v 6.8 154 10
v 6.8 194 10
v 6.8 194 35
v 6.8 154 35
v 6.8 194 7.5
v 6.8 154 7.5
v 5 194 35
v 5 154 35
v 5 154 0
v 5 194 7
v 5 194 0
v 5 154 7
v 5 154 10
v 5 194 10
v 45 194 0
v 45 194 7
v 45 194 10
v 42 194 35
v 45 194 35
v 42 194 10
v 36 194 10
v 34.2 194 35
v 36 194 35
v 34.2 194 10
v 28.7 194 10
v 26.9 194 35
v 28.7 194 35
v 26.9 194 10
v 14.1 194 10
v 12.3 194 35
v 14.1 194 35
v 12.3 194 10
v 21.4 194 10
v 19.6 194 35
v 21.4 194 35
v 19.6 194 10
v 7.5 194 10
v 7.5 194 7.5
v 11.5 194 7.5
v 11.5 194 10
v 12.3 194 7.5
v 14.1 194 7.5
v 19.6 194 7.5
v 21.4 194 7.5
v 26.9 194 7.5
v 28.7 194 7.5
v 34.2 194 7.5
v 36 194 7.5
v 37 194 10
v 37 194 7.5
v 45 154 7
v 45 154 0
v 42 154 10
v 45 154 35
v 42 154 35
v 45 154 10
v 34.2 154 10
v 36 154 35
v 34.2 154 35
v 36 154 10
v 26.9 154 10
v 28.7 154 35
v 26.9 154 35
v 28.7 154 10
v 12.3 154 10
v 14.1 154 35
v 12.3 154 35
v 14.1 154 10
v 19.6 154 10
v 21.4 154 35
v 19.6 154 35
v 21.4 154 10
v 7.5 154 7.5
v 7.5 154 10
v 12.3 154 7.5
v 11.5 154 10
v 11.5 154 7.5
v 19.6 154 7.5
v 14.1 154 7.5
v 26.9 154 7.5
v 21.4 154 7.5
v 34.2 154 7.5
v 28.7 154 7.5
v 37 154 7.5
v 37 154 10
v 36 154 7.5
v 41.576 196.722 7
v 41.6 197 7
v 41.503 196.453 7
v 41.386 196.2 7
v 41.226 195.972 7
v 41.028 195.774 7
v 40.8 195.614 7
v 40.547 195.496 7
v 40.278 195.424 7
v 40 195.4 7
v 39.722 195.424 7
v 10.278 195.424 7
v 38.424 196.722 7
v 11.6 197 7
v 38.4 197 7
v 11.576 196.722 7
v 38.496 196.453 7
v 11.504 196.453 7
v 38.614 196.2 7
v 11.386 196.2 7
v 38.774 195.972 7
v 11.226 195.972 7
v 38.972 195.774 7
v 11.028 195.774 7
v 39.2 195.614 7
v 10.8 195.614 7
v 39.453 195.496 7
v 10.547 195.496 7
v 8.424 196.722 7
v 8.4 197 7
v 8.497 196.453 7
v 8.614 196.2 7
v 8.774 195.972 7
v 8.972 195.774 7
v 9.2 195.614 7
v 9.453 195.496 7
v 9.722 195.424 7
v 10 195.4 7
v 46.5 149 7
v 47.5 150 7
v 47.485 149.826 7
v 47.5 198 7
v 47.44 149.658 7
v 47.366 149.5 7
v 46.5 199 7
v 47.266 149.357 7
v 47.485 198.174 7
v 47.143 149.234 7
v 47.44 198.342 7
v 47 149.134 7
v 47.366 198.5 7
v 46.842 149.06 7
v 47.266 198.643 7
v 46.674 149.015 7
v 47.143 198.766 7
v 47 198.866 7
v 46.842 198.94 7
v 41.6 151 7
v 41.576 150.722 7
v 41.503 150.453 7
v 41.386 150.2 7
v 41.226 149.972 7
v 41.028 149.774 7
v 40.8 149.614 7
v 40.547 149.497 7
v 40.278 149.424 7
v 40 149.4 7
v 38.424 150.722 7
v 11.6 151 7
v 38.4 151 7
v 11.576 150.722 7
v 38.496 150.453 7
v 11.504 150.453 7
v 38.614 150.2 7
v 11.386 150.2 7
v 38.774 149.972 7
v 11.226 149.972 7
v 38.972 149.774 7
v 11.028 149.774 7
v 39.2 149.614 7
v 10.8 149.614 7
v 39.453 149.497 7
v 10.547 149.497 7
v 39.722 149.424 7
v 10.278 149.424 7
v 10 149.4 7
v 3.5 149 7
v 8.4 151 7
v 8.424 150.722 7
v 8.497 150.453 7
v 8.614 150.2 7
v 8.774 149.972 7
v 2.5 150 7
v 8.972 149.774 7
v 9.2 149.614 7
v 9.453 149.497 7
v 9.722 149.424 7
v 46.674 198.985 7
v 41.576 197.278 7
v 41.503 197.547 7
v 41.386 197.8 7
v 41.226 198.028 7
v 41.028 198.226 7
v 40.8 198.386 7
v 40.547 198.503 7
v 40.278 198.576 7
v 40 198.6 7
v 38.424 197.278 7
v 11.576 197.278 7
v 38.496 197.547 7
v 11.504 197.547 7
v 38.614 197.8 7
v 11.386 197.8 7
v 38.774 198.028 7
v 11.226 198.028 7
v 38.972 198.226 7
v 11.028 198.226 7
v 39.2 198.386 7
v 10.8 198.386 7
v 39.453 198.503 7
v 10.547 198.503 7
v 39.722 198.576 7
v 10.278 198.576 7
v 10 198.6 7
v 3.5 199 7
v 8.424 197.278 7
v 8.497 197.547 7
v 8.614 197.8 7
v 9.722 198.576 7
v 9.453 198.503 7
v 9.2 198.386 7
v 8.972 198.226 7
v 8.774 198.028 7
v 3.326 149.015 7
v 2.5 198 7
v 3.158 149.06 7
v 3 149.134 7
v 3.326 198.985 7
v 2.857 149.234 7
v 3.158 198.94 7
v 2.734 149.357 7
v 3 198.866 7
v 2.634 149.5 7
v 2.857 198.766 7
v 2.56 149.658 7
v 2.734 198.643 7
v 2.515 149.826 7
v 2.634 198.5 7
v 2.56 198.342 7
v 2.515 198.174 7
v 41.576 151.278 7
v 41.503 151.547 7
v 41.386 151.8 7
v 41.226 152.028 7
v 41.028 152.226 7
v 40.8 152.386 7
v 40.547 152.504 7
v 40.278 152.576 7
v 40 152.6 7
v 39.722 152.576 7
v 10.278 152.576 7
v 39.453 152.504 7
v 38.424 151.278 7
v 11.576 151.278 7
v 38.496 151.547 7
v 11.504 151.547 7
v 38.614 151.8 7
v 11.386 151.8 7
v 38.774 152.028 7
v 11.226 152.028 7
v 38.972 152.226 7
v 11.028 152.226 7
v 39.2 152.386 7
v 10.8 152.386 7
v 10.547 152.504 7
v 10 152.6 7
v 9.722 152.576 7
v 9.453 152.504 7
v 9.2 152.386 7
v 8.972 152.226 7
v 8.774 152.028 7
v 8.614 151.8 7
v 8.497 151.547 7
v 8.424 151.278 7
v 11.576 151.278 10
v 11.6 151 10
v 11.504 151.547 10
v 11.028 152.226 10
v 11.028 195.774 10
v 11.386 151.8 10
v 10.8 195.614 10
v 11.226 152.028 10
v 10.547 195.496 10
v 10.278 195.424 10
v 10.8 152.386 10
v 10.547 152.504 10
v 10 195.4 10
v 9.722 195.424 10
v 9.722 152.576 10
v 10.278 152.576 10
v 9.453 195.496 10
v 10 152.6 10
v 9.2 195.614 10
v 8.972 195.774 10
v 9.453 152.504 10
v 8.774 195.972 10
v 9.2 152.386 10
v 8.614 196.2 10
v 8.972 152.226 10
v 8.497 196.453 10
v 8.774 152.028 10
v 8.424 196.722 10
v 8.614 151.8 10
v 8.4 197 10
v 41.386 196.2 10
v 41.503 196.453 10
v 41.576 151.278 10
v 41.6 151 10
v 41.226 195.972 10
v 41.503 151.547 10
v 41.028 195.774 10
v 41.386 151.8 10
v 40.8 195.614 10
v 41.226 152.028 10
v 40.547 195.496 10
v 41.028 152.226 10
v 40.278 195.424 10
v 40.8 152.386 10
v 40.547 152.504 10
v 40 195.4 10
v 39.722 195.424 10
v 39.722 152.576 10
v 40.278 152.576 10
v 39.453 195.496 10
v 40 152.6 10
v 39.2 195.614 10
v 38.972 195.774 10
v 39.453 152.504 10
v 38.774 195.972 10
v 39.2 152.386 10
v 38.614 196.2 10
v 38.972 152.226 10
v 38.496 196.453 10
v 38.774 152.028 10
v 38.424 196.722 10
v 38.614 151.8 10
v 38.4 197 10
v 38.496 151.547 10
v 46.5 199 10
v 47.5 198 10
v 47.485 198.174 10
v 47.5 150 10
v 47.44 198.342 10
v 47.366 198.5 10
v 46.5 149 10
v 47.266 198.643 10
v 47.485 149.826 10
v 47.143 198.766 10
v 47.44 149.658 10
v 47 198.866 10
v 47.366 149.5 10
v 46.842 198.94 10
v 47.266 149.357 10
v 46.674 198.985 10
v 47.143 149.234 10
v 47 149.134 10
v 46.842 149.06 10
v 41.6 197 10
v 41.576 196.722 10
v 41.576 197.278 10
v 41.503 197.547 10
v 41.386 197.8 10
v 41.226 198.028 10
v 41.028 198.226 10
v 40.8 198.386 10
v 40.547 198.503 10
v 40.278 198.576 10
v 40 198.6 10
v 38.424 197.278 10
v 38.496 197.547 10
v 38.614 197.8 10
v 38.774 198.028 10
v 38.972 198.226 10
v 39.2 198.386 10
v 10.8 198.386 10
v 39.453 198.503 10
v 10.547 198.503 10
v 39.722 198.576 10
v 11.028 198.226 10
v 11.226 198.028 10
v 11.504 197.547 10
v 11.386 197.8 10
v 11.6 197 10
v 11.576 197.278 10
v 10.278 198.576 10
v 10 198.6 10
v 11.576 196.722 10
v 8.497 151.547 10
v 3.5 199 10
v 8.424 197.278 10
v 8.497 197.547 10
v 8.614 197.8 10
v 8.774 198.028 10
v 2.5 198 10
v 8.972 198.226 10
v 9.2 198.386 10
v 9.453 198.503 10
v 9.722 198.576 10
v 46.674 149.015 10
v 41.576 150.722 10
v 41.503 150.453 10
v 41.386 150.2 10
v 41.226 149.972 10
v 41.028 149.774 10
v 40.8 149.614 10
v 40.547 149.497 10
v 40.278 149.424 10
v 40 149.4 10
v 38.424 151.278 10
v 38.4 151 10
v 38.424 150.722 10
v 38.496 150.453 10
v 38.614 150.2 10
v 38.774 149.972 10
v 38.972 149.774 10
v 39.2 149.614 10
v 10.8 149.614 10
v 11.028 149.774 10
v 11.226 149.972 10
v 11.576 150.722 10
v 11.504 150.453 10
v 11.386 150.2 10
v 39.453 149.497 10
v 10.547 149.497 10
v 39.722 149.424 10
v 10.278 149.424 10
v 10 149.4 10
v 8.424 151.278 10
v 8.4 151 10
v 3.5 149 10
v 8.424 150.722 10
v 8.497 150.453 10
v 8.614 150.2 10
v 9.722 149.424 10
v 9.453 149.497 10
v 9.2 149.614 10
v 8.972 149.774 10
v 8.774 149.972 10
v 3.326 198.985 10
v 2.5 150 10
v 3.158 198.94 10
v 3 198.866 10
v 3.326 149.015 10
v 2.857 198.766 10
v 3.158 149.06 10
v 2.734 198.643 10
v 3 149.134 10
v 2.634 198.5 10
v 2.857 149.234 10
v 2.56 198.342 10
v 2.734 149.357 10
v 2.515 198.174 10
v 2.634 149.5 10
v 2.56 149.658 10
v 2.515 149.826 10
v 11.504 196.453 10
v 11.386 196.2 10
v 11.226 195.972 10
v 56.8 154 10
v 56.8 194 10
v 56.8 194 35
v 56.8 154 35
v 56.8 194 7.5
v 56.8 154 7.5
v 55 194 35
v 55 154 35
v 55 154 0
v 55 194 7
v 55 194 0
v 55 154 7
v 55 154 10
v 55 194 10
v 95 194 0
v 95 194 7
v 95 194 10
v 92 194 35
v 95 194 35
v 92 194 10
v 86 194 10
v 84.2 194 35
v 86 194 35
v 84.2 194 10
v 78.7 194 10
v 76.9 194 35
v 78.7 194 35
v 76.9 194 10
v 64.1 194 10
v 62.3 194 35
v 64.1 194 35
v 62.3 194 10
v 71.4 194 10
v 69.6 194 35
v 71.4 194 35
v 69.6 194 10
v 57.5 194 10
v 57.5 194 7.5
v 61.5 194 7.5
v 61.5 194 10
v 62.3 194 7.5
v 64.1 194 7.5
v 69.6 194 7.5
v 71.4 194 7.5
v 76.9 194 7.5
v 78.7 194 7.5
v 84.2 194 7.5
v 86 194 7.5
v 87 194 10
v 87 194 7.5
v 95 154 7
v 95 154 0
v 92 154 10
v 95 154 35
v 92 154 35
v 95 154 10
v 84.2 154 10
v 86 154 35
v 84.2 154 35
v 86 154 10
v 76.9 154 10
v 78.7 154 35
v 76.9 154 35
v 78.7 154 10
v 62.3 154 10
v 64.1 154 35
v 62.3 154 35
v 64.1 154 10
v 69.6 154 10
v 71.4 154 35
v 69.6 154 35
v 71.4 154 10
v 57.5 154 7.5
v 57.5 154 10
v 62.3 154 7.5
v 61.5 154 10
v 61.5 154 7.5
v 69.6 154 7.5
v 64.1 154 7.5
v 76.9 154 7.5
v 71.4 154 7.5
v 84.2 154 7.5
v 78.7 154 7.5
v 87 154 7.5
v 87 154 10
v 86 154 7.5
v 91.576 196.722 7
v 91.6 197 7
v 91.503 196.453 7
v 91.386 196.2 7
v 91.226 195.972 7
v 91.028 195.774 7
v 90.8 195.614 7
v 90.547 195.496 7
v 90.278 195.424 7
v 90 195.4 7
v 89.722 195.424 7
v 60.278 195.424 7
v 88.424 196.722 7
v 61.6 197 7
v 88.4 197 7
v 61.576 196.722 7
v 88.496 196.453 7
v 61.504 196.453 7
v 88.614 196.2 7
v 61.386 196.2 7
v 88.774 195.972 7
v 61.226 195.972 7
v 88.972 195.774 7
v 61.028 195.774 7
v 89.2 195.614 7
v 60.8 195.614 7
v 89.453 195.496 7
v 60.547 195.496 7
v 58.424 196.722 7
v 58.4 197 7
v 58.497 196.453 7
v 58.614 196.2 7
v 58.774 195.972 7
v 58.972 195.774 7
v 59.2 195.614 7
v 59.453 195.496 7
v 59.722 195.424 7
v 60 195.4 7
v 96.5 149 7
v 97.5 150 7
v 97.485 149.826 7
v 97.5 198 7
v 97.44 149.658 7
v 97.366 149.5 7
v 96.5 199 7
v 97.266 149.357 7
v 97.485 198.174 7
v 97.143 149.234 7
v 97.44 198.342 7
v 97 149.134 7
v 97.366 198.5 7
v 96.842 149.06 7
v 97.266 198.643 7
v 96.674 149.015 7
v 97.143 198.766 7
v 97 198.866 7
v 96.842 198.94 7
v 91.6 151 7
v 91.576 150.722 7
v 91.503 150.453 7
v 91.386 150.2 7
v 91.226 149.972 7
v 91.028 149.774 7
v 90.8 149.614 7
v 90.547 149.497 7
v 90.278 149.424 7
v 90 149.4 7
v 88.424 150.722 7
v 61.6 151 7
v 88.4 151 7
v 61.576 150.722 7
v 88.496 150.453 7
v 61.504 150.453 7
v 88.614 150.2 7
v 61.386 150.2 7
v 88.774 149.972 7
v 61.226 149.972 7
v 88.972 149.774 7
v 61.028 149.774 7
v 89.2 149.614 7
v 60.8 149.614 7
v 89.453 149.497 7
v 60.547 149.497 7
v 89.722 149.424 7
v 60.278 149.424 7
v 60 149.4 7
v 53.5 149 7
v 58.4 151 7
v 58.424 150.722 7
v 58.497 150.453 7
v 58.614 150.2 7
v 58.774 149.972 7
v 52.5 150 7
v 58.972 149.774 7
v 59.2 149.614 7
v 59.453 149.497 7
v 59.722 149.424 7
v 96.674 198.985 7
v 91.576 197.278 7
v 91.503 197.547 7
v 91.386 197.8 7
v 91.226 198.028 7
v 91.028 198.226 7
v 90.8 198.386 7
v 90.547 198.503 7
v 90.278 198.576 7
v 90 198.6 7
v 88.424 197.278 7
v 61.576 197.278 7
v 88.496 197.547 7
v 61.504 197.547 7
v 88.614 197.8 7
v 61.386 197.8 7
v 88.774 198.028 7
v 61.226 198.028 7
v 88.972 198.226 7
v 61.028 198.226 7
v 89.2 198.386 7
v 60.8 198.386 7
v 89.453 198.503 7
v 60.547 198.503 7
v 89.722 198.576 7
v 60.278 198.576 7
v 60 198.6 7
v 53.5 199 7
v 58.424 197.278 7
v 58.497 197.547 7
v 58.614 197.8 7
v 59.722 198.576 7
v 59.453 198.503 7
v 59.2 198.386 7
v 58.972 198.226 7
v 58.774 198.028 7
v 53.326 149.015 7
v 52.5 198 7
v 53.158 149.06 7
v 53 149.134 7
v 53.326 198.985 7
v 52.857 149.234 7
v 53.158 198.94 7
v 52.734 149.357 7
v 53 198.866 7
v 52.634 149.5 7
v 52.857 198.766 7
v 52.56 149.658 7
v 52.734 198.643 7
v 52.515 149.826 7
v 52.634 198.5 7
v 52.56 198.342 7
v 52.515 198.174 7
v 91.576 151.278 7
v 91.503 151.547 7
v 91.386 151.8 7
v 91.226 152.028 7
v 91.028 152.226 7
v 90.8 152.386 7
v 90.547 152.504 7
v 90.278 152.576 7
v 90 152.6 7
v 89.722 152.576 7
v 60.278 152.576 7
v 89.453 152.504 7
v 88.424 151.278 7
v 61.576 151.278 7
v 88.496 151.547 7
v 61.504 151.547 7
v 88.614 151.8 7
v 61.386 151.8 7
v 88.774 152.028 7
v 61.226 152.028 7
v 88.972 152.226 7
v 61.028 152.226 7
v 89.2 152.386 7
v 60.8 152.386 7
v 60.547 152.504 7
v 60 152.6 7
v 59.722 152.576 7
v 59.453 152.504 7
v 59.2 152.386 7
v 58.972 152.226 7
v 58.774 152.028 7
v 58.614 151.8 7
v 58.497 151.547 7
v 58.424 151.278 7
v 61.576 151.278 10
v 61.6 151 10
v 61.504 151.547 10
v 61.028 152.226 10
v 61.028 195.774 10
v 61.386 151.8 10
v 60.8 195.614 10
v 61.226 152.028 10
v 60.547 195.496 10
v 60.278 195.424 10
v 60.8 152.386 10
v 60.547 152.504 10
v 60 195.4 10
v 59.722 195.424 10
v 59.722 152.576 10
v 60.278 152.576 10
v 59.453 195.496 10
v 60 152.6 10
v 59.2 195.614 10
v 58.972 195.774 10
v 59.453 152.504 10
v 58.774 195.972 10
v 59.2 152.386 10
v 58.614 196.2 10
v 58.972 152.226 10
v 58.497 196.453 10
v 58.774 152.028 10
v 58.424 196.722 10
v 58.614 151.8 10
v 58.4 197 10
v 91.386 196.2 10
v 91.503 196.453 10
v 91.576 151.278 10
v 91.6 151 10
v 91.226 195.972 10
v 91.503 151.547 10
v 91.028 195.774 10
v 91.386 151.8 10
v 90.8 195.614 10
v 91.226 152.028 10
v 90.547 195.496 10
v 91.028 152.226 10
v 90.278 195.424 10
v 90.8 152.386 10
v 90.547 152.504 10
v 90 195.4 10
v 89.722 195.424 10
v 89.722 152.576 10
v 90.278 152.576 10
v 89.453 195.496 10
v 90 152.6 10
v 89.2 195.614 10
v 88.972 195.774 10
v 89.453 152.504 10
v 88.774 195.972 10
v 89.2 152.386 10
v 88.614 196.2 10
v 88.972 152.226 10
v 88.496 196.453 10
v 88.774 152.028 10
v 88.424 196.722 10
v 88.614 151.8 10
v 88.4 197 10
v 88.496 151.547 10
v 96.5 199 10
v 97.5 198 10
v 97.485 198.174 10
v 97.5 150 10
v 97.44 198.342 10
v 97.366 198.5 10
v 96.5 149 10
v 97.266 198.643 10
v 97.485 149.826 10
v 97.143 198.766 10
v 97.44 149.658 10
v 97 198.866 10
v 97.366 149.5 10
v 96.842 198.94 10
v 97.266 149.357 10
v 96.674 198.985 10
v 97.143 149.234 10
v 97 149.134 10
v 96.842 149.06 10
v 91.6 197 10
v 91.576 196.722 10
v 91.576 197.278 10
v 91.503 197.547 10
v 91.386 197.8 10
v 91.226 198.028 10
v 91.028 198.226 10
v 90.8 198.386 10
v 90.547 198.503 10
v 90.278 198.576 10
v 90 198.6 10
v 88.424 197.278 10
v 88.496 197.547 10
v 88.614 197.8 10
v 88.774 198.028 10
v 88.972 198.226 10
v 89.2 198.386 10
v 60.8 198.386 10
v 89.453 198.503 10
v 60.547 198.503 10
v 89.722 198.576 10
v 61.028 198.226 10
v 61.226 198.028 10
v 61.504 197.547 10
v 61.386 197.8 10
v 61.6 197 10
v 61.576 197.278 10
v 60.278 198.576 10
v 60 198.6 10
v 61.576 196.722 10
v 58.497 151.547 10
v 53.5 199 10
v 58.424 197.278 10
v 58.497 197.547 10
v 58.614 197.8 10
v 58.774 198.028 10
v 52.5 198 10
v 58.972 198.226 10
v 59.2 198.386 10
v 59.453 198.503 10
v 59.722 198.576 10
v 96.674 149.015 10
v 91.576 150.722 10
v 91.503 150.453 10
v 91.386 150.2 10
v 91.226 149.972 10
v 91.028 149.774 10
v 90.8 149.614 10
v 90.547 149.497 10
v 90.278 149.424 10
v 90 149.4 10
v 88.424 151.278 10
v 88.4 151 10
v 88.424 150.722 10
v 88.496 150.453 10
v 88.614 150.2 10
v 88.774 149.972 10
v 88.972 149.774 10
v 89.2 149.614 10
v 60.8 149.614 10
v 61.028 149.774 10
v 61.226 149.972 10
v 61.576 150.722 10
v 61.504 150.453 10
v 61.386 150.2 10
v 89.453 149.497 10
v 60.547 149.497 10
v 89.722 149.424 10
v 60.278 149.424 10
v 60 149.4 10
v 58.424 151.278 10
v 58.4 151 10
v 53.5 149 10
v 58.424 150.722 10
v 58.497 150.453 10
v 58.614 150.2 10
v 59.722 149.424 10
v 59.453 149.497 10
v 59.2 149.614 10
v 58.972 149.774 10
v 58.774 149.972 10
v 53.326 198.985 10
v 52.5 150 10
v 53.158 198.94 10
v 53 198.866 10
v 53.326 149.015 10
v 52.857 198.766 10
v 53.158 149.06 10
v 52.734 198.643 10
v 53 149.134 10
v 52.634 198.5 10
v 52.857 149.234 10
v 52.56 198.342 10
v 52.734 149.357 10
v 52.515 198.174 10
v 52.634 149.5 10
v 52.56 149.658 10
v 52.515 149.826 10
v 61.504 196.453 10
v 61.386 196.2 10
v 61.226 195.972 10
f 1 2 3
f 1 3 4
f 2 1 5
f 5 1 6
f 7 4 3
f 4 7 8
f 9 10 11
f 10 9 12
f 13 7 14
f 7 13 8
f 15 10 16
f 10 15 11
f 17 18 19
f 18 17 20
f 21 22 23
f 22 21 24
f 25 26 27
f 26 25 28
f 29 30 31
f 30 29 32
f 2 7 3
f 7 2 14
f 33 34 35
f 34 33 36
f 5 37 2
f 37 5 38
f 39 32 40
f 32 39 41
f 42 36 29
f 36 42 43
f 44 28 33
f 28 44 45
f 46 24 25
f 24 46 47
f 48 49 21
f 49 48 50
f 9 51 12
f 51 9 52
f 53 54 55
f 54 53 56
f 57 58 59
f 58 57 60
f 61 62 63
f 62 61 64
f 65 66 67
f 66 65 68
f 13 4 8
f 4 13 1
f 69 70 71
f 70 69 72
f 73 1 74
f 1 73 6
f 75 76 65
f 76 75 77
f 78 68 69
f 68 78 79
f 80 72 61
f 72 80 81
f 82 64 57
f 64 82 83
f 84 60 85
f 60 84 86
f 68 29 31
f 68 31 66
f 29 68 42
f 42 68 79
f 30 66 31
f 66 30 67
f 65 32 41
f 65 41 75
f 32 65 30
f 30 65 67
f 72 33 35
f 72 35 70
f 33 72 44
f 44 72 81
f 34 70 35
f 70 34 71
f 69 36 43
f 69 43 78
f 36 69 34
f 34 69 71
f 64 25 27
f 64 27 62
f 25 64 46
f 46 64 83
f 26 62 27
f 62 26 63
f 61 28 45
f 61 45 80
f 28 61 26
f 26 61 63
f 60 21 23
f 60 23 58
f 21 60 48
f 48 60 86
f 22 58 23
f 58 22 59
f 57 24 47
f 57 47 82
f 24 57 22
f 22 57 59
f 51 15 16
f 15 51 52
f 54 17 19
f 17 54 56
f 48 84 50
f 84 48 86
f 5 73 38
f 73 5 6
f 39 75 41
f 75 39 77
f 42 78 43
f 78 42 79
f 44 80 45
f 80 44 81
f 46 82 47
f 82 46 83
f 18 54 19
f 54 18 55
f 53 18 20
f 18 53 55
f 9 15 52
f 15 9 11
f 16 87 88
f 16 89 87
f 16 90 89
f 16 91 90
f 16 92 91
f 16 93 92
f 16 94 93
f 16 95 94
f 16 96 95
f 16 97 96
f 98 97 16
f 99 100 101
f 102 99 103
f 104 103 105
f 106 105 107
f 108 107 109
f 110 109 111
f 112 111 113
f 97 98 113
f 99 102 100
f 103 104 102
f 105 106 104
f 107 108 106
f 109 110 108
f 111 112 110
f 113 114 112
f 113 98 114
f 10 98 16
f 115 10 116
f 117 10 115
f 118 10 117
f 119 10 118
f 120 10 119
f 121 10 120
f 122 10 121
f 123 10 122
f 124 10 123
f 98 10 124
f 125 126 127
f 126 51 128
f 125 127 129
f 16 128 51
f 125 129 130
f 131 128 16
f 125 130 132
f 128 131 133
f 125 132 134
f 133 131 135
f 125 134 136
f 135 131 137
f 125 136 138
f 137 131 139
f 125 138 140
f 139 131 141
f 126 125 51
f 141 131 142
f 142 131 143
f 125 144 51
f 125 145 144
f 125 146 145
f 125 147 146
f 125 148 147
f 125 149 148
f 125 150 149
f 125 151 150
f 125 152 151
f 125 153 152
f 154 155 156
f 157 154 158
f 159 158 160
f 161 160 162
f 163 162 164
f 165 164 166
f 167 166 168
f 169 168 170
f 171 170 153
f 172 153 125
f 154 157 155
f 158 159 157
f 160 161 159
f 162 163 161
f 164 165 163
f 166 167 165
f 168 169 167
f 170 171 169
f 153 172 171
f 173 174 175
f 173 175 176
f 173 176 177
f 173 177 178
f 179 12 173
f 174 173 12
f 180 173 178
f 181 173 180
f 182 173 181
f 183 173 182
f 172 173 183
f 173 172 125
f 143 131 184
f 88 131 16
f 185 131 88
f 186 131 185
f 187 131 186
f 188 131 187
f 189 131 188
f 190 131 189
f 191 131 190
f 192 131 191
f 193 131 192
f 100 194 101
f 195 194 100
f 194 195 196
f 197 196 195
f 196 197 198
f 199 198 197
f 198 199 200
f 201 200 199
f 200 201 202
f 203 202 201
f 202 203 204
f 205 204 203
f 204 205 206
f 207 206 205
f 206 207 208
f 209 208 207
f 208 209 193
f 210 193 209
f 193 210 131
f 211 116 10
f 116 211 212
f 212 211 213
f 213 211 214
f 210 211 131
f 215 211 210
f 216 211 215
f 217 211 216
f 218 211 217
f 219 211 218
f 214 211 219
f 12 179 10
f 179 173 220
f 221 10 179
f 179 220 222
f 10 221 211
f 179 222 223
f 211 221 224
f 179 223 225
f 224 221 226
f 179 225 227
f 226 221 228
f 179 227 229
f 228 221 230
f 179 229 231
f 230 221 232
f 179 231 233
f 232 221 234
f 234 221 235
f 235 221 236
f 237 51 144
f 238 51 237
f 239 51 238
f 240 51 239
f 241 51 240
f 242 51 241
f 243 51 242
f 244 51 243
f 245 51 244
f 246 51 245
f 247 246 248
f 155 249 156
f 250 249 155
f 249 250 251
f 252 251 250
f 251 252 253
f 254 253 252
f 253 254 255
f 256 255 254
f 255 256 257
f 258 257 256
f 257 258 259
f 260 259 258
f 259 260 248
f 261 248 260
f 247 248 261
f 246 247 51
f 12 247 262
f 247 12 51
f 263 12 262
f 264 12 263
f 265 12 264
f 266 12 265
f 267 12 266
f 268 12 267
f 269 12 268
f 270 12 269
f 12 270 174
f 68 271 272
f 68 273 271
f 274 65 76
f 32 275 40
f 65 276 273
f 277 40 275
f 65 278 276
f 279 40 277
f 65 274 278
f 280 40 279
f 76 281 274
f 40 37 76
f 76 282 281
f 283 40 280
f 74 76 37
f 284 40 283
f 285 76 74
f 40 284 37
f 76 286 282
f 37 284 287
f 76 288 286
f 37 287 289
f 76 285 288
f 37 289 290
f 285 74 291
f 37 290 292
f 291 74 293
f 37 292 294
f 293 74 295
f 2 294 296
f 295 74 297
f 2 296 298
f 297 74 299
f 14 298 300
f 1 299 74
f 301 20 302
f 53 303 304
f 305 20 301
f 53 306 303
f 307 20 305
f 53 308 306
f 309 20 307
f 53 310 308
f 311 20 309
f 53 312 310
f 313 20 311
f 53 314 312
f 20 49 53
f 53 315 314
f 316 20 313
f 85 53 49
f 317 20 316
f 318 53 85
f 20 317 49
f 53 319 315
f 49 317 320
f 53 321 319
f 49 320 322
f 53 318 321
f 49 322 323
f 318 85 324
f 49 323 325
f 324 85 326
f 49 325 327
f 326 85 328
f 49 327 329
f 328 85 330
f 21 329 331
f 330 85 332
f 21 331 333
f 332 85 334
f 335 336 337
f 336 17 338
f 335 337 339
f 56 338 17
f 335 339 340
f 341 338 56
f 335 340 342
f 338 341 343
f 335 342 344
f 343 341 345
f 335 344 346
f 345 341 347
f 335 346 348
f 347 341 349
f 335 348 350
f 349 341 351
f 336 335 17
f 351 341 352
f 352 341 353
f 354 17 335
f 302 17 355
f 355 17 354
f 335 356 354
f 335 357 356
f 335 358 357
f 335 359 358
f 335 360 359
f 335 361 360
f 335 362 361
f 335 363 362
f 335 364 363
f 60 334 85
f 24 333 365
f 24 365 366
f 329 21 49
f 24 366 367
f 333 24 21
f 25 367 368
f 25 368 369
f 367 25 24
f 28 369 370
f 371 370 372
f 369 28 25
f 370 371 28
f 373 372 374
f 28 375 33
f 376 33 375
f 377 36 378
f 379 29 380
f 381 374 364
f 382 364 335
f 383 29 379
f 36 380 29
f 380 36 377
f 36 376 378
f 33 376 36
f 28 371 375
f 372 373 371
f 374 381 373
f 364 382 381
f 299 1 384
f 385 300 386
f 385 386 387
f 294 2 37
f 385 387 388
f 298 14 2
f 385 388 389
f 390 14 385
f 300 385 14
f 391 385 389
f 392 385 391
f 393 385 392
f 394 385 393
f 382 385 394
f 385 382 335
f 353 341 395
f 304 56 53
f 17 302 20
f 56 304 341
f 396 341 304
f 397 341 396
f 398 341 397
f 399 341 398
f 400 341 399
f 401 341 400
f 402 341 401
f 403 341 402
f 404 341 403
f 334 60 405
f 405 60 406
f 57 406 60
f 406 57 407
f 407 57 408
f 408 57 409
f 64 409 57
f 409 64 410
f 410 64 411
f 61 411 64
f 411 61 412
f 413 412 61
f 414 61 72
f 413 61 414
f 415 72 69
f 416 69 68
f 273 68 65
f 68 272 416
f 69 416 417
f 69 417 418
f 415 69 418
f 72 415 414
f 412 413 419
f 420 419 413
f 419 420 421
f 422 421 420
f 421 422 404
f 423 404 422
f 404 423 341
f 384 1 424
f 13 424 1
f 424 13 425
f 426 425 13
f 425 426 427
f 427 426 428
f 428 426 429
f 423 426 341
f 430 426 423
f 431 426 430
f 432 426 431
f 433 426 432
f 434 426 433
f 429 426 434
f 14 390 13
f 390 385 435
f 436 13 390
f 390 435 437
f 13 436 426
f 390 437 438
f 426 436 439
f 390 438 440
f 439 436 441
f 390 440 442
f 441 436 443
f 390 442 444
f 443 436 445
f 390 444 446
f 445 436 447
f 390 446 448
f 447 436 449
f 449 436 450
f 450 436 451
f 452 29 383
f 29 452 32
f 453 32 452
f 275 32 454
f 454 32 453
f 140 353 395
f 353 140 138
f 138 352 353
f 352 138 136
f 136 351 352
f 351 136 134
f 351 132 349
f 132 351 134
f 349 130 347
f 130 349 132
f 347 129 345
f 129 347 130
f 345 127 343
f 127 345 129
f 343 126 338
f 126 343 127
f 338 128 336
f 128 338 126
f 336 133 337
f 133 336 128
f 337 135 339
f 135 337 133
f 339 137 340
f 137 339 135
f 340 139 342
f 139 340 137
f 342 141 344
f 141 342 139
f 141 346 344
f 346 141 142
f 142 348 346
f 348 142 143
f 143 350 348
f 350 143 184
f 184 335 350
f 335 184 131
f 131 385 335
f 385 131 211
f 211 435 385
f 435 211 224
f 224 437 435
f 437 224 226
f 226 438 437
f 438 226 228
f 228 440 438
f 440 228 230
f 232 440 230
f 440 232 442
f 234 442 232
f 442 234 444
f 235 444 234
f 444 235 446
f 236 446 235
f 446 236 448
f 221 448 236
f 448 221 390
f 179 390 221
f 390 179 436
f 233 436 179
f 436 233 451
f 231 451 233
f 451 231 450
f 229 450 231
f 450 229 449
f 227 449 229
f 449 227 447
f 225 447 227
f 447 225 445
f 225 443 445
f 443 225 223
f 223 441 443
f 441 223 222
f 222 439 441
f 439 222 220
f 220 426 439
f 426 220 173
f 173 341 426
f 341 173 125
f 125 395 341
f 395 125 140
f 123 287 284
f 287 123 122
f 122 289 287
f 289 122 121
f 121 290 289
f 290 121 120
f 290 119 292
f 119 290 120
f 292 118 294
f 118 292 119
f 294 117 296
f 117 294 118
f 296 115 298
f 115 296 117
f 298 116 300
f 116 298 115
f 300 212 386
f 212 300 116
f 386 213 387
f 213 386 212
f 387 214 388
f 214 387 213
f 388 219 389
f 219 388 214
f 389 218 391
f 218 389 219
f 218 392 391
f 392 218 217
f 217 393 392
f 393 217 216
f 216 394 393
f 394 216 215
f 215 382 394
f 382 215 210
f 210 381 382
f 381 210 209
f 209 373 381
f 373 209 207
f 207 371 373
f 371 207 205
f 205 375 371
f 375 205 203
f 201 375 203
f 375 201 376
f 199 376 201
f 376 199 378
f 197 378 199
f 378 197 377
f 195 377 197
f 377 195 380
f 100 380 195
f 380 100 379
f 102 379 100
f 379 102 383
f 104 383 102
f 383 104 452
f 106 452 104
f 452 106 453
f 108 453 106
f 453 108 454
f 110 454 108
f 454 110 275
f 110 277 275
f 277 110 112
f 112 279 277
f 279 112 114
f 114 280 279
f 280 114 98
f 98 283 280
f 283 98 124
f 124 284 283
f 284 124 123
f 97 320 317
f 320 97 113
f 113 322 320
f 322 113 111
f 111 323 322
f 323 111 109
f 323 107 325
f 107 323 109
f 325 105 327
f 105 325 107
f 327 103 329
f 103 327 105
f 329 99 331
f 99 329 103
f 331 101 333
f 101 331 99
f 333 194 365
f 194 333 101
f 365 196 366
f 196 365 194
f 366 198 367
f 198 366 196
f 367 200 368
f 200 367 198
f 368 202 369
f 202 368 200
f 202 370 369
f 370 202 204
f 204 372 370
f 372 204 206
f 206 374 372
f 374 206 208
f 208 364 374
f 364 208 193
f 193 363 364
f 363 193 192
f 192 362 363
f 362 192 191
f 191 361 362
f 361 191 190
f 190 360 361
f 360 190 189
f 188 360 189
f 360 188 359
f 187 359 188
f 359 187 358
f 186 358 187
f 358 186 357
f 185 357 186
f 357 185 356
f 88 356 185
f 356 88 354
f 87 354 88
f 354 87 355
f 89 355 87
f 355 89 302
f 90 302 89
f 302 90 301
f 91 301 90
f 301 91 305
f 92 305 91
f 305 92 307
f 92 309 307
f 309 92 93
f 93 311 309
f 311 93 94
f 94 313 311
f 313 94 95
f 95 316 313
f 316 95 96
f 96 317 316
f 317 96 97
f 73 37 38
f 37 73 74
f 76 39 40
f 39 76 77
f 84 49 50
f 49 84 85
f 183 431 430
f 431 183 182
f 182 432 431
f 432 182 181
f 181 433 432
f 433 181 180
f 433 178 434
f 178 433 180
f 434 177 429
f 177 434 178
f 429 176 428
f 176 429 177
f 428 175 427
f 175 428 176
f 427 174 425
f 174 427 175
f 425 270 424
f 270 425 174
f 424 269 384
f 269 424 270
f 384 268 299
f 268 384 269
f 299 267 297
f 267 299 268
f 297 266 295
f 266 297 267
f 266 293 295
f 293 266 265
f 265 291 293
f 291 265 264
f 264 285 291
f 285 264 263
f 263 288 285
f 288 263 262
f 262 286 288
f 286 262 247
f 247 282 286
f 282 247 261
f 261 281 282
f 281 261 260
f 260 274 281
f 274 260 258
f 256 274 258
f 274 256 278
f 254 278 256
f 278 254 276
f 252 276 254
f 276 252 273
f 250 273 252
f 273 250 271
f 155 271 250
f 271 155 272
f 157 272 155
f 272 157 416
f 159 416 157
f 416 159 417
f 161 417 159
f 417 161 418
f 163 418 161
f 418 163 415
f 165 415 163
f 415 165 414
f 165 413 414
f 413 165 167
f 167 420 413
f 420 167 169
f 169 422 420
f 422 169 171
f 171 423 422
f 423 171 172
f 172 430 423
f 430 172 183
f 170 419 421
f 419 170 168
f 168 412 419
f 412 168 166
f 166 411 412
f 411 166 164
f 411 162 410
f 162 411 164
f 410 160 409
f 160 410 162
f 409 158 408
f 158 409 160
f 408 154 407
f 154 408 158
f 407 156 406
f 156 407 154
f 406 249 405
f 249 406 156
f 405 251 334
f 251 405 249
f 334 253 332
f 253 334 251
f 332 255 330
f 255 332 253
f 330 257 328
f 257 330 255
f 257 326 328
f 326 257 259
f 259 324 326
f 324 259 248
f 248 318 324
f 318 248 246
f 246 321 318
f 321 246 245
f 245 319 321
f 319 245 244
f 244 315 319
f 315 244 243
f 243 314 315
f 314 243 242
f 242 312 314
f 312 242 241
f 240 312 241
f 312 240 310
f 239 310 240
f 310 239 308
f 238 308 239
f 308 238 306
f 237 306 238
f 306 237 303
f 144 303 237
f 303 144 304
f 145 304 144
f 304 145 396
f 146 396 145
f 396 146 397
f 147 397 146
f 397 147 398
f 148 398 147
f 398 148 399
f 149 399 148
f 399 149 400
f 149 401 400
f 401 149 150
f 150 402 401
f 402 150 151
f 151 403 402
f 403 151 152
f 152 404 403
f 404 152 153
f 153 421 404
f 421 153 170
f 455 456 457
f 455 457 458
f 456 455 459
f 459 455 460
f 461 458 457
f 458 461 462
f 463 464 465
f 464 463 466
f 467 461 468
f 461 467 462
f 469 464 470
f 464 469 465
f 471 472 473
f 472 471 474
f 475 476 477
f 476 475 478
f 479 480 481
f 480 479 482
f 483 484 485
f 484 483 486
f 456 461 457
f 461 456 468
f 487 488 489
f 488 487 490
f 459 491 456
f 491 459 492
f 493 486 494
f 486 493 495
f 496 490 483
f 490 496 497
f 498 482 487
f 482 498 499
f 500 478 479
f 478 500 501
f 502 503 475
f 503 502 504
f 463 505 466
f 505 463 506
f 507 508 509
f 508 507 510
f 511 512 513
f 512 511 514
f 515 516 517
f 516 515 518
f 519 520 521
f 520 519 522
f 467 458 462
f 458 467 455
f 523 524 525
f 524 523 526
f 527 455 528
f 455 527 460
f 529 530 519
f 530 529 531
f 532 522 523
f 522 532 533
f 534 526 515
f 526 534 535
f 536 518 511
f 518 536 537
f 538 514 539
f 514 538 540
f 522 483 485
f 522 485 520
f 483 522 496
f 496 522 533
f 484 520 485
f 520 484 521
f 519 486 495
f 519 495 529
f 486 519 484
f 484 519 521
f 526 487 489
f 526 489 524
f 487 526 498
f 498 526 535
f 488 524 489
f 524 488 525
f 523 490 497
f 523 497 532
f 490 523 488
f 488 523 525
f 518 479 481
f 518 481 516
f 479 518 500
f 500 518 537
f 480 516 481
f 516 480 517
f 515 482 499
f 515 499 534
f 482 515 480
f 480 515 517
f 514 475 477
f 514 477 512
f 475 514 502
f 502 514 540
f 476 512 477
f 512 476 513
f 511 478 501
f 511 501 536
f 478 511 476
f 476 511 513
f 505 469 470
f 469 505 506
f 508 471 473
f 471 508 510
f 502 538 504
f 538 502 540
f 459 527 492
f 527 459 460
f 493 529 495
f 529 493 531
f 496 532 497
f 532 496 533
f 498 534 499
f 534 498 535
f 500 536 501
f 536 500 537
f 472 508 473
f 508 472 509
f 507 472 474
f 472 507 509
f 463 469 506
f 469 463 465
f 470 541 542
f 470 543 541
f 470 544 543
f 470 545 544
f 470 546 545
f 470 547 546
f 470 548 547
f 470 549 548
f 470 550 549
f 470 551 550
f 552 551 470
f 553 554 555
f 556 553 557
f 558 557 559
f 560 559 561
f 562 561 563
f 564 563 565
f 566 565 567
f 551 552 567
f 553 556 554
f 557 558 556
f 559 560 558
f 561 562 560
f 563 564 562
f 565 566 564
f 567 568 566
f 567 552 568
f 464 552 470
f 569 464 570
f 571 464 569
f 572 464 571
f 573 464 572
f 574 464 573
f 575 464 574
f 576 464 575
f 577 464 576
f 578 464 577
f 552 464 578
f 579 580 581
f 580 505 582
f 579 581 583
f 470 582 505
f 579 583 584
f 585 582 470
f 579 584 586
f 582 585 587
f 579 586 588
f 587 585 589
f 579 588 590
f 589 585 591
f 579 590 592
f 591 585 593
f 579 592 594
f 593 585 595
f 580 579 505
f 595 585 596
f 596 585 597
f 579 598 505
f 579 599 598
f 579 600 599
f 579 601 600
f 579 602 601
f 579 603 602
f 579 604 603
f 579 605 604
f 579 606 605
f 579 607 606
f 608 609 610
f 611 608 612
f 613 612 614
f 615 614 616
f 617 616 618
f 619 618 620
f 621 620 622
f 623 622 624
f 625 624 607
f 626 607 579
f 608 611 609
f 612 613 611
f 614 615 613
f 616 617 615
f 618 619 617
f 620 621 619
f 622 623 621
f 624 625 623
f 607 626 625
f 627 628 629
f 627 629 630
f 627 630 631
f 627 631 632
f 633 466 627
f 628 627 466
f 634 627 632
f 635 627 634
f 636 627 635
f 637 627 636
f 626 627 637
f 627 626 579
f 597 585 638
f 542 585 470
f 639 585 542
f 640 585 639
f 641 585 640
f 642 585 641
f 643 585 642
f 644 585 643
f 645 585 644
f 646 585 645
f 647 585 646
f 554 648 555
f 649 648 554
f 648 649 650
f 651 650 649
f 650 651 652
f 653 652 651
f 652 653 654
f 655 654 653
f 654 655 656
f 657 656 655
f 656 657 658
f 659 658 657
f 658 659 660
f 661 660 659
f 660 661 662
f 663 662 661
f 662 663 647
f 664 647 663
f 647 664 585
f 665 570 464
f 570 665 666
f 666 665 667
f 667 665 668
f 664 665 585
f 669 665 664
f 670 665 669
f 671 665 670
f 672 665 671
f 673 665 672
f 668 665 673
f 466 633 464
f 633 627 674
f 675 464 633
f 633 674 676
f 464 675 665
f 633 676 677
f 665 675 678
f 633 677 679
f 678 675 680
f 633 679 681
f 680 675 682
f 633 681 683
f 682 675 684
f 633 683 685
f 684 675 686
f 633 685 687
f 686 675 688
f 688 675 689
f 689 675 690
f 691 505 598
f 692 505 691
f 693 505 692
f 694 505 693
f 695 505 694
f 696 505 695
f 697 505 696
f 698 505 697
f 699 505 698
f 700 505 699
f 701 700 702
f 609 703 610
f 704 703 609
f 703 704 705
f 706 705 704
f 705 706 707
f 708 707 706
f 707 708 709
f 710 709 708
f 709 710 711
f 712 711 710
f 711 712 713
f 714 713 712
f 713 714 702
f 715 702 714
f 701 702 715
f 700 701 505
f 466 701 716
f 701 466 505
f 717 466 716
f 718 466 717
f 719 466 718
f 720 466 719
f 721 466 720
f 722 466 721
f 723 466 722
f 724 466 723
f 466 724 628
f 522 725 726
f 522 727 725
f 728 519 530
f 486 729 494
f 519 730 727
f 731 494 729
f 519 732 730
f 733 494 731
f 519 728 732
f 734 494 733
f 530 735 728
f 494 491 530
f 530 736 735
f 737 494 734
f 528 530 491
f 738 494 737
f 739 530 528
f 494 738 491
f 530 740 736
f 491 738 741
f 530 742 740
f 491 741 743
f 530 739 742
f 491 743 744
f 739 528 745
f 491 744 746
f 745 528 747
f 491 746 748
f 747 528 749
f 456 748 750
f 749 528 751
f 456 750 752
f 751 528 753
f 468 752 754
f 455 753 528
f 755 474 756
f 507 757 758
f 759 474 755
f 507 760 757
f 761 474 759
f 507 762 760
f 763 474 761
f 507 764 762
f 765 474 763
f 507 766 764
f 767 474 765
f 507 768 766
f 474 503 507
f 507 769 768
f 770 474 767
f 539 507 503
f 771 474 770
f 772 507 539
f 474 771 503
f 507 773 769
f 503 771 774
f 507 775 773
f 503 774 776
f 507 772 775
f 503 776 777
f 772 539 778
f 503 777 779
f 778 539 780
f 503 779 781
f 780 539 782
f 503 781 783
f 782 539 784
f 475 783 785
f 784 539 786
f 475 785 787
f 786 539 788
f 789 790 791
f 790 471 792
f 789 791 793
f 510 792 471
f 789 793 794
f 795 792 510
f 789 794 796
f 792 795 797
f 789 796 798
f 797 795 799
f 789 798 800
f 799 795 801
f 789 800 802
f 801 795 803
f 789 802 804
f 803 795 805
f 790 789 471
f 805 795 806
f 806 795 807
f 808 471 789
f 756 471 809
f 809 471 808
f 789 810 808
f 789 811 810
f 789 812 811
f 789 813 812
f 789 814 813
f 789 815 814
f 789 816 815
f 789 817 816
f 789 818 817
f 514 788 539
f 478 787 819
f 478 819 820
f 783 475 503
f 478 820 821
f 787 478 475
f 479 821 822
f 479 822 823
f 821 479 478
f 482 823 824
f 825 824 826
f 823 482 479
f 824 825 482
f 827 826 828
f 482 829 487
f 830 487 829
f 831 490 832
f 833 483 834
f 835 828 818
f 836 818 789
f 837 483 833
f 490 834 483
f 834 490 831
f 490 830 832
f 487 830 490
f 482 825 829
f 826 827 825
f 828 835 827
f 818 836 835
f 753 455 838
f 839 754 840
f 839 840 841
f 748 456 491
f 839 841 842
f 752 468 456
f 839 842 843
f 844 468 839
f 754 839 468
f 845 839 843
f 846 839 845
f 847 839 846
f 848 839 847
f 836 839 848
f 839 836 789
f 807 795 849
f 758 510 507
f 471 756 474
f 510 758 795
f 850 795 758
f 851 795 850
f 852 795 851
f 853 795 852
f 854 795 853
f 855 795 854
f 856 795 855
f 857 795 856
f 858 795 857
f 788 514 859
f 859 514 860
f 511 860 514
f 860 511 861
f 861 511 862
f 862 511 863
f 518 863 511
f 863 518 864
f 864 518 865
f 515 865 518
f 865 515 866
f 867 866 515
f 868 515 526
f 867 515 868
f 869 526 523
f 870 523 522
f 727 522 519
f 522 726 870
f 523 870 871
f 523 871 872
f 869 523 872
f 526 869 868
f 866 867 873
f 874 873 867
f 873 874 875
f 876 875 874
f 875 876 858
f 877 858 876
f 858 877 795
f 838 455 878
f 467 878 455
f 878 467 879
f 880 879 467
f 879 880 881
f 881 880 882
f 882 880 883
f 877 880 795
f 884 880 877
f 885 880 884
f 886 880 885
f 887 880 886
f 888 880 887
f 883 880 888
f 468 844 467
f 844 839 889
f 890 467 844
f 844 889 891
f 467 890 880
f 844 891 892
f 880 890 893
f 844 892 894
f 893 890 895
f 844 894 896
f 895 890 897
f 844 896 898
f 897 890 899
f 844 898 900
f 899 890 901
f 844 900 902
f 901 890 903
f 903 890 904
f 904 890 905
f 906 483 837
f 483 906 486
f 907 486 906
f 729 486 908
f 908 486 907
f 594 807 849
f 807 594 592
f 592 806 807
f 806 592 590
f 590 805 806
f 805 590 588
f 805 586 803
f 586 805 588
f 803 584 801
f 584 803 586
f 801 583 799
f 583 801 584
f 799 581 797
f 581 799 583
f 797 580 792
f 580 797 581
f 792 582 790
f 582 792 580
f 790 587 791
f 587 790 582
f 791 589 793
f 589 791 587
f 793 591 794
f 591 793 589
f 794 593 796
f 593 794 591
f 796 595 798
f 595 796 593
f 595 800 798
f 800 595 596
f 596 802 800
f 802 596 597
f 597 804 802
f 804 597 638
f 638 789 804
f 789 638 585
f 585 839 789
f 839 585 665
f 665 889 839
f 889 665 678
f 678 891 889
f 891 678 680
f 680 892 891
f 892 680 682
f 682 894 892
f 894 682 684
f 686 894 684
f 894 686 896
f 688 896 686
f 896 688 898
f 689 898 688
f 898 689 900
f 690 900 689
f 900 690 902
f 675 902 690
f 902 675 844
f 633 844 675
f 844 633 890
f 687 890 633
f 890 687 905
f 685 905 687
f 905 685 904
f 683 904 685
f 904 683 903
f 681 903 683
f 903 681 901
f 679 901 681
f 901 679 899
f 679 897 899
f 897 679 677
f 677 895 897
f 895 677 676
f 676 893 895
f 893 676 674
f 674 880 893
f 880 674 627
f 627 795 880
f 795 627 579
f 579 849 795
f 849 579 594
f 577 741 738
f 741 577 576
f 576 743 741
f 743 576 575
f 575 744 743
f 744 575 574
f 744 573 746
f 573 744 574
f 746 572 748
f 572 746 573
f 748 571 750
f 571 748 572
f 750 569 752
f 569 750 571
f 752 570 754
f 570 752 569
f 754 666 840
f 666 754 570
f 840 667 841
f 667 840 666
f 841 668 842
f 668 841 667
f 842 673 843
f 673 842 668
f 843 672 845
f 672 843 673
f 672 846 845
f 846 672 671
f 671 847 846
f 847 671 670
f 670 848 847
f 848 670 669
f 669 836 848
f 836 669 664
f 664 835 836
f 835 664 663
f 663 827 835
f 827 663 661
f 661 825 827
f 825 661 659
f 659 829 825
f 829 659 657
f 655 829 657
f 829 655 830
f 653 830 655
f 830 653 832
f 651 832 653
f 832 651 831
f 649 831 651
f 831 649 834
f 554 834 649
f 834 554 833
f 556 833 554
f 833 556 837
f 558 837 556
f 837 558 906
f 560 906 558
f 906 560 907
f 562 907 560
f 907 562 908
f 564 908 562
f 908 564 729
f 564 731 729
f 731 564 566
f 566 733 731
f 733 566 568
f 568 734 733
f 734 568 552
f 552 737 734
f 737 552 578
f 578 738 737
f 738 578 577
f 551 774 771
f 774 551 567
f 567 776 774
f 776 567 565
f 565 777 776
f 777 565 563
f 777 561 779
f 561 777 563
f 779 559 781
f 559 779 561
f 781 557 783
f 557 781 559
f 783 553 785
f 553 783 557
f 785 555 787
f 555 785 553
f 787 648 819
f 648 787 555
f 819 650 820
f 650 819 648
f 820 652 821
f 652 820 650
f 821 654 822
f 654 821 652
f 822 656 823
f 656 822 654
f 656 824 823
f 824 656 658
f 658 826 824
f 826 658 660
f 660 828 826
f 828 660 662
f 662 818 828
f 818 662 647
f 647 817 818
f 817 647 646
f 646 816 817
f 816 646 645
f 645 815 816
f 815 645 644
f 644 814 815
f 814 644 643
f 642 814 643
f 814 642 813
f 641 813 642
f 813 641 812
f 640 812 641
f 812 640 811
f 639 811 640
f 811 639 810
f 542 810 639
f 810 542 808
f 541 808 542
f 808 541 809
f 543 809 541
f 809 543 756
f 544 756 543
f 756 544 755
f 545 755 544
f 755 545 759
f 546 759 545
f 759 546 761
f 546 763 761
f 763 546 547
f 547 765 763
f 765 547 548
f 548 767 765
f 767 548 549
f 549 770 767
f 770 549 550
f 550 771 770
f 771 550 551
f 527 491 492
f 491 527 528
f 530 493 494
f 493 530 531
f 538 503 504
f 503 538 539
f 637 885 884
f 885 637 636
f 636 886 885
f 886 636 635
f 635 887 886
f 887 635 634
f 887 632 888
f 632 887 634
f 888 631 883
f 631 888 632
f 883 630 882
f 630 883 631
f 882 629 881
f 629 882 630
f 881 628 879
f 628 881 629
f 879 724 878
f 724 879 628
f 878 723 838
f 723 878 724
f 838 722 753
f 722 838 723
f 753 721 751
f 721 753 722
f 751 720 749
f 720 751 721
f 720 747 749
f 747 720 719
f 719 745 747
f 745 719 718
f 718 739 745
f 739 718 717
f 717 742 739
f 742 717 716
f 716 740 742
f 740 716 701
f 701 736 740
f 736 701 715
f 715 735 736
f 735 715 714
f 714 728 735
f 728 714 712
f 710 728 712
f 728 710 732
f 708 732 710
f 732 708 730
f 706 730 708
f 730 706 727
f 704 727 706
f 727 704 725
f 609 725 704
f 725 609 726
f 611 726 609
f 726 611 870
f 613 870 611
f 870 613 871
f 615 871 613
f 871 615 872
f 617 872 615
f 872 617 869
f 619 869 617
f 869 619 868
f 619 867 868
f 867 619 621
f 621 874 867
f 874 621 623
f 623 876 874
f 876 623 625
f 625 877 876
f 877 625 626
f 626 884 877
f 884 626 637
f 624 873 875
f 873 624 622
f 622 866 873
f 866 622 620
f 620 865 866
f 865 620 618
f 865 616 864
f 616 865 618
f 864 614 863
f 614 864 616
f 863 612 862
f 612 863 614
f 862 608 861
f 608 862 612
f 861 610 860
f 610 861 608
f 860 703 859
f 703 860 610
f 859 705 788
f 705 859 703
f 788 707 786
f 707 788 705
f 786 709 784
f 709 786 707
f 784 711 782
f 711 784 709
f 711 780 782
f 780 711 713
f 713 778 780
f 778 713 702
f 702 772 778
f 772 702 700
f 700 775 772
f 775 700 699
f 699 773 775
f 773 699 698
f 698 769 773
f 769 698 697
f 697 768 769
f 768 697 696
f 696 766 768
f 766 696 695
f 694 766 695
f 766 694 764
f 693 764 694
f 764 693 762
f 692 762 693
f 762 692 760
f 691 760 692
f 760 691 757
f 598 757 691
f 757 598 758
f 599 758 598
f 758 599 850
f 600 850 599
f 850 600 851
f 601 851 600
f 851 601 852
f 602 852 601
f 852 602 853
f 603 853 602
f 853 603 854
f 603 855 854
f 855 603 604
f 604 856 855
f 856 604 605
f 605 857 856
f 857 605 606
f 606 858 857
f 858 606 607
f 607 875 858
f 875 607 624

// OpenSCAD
w = 100;
d = 200;
h = 1.5;

isolate = 1;

fin_w = 5;

peltier_w = 40;
peltier_h = 5;
peltier_d = 40;

module peltier() {
  color("white")
  cube(size=[peltier_w, peltier_d, peltier_h], center=true);
}

module heatsink() {
  color("gray") {
    translate([0, 0, 2.5/2])
      cube(size=[40, 40, 2.5], center=true);

    translate([40/2 - 3/2, 0, 30/2]) cube(size=[3, 40, 30], center=true);

    for (x=[0:4]) {
      translate([-40/2 + 1.8/2 + x * (5.5 + 1.8), 0, 30/2]) cube(size=[1.8, 40, 30], center=true);
    }
  }
}

module radiator_traces_2d() {
  difference() {
    intersection() {
      // outline
      square(size=[w, d], center=true);

      union() {
        // left rail
        translate([-w/2 + fin_w/2, 0, 0])
          square(size=[fin_w, d], center=true);

        // right rail
        translate([w/2 - fin_w/2, 0, 0])
          square(size=[fin_w, d], center=true);

        // left peltier pad
        translate([-w/2 + (w/2 - isolate)/2, d/2 - (peltier_d + 12) / 2, 0]) 
          square(size=[w/2 - isolate / 2, peltier_d+12], center=true);

        // right peltier pad
        translate([w/2 - (w/2 - isolate)/2, d/2 - (peltier_d + 12) / 2, 0]) 
          square(size=[w/2 - isolate / 2, peltier_d+12], center=true);

        translate([0, d / 2 - peltier_d - 12 - isolate - fin_w / 2, 0]) {
          fin_len = w - fin_w - isolate;
          // left fins
          for (y=[0:12]) {
            translate([-w/2 + fin_len/2, -y * (2 * fin_w + 2 * isolate), 0]) 
              square(size=[fin_len, fin_w], center=true);
          }

          // right fins
          for (y=[0:11]) {
            translate([w/2 - fin_len/2, -(y + 0.5) * (2 * fin_w + 2 * isolate), 0])
              square(size=[fin_len, fin_w], center=true);
          }
        }
      }
    }

    for (x1=[-1,1]) {
      for (x2=[-1,1], y=[-1,1]) {
        x = x1 * (w / 2 - fin_w - peltier_w / 2) + x2 * (peltier_w / 2 - 5);
        y = d/2 - 6 - peltier_d/2 + y * (peltier_d / 2 + 3);
        translate([x, y, 0]) circle(r=3.2/2, $fn=36);
      }
    }
  }
}

module clamp_plate_2d() {
  union() {
    difference() {
      // square(size=[45, 50], center=true);
      hull() for (x=[-1,1], y=[-1,1]) {
        translate([x * (45/2 - 1), y * (50/2 - 1), 0]) circle(r=1, $fn=36);
      }

      square(size=[40, 40], center=true);

      for (x1=[-1,1]) {
        for (x2=[-1,1], y=[-1,1]) {
          x = x1 * 0 + x2 * (peltier_w / 2 - 5);
          y = y * (peltier_d / 2 + 3);
          translate([x, y, 0]) circle(r=3.2/2, $fn=36);
        }
      }
    }
    translate([-40/2 + 4.5, 0, 0]) square(size=[4, 40.1], center=true);

    translate([40/2 - 5.5, 0, 0]) square(size=[5, 40.1], center=true);
  }
}

module assembly() {
  for (x=[-1,1]) {
    translate([w / 2 + x * (5 + peltier_w / 2), d - peltier_d/2 - 6, peltier_h / 2]) {
      peltier();

      translate([0, 0, peltier_h/2]) heatsink();

      color("blue")
      translate([0, 0, peltier_h/2 + 2]) linear_extrude(height=3) clamp_plate_2d();
    }
  }

  //difference() {
    translate([w/2, d/2, -1.60])
      color("green")
        square(size=[w + 0.1, d + 0.1], center=true);

    translate([w/2, d/2, 0])
      radiator_traces_2d();
  //}
}

assembly();
